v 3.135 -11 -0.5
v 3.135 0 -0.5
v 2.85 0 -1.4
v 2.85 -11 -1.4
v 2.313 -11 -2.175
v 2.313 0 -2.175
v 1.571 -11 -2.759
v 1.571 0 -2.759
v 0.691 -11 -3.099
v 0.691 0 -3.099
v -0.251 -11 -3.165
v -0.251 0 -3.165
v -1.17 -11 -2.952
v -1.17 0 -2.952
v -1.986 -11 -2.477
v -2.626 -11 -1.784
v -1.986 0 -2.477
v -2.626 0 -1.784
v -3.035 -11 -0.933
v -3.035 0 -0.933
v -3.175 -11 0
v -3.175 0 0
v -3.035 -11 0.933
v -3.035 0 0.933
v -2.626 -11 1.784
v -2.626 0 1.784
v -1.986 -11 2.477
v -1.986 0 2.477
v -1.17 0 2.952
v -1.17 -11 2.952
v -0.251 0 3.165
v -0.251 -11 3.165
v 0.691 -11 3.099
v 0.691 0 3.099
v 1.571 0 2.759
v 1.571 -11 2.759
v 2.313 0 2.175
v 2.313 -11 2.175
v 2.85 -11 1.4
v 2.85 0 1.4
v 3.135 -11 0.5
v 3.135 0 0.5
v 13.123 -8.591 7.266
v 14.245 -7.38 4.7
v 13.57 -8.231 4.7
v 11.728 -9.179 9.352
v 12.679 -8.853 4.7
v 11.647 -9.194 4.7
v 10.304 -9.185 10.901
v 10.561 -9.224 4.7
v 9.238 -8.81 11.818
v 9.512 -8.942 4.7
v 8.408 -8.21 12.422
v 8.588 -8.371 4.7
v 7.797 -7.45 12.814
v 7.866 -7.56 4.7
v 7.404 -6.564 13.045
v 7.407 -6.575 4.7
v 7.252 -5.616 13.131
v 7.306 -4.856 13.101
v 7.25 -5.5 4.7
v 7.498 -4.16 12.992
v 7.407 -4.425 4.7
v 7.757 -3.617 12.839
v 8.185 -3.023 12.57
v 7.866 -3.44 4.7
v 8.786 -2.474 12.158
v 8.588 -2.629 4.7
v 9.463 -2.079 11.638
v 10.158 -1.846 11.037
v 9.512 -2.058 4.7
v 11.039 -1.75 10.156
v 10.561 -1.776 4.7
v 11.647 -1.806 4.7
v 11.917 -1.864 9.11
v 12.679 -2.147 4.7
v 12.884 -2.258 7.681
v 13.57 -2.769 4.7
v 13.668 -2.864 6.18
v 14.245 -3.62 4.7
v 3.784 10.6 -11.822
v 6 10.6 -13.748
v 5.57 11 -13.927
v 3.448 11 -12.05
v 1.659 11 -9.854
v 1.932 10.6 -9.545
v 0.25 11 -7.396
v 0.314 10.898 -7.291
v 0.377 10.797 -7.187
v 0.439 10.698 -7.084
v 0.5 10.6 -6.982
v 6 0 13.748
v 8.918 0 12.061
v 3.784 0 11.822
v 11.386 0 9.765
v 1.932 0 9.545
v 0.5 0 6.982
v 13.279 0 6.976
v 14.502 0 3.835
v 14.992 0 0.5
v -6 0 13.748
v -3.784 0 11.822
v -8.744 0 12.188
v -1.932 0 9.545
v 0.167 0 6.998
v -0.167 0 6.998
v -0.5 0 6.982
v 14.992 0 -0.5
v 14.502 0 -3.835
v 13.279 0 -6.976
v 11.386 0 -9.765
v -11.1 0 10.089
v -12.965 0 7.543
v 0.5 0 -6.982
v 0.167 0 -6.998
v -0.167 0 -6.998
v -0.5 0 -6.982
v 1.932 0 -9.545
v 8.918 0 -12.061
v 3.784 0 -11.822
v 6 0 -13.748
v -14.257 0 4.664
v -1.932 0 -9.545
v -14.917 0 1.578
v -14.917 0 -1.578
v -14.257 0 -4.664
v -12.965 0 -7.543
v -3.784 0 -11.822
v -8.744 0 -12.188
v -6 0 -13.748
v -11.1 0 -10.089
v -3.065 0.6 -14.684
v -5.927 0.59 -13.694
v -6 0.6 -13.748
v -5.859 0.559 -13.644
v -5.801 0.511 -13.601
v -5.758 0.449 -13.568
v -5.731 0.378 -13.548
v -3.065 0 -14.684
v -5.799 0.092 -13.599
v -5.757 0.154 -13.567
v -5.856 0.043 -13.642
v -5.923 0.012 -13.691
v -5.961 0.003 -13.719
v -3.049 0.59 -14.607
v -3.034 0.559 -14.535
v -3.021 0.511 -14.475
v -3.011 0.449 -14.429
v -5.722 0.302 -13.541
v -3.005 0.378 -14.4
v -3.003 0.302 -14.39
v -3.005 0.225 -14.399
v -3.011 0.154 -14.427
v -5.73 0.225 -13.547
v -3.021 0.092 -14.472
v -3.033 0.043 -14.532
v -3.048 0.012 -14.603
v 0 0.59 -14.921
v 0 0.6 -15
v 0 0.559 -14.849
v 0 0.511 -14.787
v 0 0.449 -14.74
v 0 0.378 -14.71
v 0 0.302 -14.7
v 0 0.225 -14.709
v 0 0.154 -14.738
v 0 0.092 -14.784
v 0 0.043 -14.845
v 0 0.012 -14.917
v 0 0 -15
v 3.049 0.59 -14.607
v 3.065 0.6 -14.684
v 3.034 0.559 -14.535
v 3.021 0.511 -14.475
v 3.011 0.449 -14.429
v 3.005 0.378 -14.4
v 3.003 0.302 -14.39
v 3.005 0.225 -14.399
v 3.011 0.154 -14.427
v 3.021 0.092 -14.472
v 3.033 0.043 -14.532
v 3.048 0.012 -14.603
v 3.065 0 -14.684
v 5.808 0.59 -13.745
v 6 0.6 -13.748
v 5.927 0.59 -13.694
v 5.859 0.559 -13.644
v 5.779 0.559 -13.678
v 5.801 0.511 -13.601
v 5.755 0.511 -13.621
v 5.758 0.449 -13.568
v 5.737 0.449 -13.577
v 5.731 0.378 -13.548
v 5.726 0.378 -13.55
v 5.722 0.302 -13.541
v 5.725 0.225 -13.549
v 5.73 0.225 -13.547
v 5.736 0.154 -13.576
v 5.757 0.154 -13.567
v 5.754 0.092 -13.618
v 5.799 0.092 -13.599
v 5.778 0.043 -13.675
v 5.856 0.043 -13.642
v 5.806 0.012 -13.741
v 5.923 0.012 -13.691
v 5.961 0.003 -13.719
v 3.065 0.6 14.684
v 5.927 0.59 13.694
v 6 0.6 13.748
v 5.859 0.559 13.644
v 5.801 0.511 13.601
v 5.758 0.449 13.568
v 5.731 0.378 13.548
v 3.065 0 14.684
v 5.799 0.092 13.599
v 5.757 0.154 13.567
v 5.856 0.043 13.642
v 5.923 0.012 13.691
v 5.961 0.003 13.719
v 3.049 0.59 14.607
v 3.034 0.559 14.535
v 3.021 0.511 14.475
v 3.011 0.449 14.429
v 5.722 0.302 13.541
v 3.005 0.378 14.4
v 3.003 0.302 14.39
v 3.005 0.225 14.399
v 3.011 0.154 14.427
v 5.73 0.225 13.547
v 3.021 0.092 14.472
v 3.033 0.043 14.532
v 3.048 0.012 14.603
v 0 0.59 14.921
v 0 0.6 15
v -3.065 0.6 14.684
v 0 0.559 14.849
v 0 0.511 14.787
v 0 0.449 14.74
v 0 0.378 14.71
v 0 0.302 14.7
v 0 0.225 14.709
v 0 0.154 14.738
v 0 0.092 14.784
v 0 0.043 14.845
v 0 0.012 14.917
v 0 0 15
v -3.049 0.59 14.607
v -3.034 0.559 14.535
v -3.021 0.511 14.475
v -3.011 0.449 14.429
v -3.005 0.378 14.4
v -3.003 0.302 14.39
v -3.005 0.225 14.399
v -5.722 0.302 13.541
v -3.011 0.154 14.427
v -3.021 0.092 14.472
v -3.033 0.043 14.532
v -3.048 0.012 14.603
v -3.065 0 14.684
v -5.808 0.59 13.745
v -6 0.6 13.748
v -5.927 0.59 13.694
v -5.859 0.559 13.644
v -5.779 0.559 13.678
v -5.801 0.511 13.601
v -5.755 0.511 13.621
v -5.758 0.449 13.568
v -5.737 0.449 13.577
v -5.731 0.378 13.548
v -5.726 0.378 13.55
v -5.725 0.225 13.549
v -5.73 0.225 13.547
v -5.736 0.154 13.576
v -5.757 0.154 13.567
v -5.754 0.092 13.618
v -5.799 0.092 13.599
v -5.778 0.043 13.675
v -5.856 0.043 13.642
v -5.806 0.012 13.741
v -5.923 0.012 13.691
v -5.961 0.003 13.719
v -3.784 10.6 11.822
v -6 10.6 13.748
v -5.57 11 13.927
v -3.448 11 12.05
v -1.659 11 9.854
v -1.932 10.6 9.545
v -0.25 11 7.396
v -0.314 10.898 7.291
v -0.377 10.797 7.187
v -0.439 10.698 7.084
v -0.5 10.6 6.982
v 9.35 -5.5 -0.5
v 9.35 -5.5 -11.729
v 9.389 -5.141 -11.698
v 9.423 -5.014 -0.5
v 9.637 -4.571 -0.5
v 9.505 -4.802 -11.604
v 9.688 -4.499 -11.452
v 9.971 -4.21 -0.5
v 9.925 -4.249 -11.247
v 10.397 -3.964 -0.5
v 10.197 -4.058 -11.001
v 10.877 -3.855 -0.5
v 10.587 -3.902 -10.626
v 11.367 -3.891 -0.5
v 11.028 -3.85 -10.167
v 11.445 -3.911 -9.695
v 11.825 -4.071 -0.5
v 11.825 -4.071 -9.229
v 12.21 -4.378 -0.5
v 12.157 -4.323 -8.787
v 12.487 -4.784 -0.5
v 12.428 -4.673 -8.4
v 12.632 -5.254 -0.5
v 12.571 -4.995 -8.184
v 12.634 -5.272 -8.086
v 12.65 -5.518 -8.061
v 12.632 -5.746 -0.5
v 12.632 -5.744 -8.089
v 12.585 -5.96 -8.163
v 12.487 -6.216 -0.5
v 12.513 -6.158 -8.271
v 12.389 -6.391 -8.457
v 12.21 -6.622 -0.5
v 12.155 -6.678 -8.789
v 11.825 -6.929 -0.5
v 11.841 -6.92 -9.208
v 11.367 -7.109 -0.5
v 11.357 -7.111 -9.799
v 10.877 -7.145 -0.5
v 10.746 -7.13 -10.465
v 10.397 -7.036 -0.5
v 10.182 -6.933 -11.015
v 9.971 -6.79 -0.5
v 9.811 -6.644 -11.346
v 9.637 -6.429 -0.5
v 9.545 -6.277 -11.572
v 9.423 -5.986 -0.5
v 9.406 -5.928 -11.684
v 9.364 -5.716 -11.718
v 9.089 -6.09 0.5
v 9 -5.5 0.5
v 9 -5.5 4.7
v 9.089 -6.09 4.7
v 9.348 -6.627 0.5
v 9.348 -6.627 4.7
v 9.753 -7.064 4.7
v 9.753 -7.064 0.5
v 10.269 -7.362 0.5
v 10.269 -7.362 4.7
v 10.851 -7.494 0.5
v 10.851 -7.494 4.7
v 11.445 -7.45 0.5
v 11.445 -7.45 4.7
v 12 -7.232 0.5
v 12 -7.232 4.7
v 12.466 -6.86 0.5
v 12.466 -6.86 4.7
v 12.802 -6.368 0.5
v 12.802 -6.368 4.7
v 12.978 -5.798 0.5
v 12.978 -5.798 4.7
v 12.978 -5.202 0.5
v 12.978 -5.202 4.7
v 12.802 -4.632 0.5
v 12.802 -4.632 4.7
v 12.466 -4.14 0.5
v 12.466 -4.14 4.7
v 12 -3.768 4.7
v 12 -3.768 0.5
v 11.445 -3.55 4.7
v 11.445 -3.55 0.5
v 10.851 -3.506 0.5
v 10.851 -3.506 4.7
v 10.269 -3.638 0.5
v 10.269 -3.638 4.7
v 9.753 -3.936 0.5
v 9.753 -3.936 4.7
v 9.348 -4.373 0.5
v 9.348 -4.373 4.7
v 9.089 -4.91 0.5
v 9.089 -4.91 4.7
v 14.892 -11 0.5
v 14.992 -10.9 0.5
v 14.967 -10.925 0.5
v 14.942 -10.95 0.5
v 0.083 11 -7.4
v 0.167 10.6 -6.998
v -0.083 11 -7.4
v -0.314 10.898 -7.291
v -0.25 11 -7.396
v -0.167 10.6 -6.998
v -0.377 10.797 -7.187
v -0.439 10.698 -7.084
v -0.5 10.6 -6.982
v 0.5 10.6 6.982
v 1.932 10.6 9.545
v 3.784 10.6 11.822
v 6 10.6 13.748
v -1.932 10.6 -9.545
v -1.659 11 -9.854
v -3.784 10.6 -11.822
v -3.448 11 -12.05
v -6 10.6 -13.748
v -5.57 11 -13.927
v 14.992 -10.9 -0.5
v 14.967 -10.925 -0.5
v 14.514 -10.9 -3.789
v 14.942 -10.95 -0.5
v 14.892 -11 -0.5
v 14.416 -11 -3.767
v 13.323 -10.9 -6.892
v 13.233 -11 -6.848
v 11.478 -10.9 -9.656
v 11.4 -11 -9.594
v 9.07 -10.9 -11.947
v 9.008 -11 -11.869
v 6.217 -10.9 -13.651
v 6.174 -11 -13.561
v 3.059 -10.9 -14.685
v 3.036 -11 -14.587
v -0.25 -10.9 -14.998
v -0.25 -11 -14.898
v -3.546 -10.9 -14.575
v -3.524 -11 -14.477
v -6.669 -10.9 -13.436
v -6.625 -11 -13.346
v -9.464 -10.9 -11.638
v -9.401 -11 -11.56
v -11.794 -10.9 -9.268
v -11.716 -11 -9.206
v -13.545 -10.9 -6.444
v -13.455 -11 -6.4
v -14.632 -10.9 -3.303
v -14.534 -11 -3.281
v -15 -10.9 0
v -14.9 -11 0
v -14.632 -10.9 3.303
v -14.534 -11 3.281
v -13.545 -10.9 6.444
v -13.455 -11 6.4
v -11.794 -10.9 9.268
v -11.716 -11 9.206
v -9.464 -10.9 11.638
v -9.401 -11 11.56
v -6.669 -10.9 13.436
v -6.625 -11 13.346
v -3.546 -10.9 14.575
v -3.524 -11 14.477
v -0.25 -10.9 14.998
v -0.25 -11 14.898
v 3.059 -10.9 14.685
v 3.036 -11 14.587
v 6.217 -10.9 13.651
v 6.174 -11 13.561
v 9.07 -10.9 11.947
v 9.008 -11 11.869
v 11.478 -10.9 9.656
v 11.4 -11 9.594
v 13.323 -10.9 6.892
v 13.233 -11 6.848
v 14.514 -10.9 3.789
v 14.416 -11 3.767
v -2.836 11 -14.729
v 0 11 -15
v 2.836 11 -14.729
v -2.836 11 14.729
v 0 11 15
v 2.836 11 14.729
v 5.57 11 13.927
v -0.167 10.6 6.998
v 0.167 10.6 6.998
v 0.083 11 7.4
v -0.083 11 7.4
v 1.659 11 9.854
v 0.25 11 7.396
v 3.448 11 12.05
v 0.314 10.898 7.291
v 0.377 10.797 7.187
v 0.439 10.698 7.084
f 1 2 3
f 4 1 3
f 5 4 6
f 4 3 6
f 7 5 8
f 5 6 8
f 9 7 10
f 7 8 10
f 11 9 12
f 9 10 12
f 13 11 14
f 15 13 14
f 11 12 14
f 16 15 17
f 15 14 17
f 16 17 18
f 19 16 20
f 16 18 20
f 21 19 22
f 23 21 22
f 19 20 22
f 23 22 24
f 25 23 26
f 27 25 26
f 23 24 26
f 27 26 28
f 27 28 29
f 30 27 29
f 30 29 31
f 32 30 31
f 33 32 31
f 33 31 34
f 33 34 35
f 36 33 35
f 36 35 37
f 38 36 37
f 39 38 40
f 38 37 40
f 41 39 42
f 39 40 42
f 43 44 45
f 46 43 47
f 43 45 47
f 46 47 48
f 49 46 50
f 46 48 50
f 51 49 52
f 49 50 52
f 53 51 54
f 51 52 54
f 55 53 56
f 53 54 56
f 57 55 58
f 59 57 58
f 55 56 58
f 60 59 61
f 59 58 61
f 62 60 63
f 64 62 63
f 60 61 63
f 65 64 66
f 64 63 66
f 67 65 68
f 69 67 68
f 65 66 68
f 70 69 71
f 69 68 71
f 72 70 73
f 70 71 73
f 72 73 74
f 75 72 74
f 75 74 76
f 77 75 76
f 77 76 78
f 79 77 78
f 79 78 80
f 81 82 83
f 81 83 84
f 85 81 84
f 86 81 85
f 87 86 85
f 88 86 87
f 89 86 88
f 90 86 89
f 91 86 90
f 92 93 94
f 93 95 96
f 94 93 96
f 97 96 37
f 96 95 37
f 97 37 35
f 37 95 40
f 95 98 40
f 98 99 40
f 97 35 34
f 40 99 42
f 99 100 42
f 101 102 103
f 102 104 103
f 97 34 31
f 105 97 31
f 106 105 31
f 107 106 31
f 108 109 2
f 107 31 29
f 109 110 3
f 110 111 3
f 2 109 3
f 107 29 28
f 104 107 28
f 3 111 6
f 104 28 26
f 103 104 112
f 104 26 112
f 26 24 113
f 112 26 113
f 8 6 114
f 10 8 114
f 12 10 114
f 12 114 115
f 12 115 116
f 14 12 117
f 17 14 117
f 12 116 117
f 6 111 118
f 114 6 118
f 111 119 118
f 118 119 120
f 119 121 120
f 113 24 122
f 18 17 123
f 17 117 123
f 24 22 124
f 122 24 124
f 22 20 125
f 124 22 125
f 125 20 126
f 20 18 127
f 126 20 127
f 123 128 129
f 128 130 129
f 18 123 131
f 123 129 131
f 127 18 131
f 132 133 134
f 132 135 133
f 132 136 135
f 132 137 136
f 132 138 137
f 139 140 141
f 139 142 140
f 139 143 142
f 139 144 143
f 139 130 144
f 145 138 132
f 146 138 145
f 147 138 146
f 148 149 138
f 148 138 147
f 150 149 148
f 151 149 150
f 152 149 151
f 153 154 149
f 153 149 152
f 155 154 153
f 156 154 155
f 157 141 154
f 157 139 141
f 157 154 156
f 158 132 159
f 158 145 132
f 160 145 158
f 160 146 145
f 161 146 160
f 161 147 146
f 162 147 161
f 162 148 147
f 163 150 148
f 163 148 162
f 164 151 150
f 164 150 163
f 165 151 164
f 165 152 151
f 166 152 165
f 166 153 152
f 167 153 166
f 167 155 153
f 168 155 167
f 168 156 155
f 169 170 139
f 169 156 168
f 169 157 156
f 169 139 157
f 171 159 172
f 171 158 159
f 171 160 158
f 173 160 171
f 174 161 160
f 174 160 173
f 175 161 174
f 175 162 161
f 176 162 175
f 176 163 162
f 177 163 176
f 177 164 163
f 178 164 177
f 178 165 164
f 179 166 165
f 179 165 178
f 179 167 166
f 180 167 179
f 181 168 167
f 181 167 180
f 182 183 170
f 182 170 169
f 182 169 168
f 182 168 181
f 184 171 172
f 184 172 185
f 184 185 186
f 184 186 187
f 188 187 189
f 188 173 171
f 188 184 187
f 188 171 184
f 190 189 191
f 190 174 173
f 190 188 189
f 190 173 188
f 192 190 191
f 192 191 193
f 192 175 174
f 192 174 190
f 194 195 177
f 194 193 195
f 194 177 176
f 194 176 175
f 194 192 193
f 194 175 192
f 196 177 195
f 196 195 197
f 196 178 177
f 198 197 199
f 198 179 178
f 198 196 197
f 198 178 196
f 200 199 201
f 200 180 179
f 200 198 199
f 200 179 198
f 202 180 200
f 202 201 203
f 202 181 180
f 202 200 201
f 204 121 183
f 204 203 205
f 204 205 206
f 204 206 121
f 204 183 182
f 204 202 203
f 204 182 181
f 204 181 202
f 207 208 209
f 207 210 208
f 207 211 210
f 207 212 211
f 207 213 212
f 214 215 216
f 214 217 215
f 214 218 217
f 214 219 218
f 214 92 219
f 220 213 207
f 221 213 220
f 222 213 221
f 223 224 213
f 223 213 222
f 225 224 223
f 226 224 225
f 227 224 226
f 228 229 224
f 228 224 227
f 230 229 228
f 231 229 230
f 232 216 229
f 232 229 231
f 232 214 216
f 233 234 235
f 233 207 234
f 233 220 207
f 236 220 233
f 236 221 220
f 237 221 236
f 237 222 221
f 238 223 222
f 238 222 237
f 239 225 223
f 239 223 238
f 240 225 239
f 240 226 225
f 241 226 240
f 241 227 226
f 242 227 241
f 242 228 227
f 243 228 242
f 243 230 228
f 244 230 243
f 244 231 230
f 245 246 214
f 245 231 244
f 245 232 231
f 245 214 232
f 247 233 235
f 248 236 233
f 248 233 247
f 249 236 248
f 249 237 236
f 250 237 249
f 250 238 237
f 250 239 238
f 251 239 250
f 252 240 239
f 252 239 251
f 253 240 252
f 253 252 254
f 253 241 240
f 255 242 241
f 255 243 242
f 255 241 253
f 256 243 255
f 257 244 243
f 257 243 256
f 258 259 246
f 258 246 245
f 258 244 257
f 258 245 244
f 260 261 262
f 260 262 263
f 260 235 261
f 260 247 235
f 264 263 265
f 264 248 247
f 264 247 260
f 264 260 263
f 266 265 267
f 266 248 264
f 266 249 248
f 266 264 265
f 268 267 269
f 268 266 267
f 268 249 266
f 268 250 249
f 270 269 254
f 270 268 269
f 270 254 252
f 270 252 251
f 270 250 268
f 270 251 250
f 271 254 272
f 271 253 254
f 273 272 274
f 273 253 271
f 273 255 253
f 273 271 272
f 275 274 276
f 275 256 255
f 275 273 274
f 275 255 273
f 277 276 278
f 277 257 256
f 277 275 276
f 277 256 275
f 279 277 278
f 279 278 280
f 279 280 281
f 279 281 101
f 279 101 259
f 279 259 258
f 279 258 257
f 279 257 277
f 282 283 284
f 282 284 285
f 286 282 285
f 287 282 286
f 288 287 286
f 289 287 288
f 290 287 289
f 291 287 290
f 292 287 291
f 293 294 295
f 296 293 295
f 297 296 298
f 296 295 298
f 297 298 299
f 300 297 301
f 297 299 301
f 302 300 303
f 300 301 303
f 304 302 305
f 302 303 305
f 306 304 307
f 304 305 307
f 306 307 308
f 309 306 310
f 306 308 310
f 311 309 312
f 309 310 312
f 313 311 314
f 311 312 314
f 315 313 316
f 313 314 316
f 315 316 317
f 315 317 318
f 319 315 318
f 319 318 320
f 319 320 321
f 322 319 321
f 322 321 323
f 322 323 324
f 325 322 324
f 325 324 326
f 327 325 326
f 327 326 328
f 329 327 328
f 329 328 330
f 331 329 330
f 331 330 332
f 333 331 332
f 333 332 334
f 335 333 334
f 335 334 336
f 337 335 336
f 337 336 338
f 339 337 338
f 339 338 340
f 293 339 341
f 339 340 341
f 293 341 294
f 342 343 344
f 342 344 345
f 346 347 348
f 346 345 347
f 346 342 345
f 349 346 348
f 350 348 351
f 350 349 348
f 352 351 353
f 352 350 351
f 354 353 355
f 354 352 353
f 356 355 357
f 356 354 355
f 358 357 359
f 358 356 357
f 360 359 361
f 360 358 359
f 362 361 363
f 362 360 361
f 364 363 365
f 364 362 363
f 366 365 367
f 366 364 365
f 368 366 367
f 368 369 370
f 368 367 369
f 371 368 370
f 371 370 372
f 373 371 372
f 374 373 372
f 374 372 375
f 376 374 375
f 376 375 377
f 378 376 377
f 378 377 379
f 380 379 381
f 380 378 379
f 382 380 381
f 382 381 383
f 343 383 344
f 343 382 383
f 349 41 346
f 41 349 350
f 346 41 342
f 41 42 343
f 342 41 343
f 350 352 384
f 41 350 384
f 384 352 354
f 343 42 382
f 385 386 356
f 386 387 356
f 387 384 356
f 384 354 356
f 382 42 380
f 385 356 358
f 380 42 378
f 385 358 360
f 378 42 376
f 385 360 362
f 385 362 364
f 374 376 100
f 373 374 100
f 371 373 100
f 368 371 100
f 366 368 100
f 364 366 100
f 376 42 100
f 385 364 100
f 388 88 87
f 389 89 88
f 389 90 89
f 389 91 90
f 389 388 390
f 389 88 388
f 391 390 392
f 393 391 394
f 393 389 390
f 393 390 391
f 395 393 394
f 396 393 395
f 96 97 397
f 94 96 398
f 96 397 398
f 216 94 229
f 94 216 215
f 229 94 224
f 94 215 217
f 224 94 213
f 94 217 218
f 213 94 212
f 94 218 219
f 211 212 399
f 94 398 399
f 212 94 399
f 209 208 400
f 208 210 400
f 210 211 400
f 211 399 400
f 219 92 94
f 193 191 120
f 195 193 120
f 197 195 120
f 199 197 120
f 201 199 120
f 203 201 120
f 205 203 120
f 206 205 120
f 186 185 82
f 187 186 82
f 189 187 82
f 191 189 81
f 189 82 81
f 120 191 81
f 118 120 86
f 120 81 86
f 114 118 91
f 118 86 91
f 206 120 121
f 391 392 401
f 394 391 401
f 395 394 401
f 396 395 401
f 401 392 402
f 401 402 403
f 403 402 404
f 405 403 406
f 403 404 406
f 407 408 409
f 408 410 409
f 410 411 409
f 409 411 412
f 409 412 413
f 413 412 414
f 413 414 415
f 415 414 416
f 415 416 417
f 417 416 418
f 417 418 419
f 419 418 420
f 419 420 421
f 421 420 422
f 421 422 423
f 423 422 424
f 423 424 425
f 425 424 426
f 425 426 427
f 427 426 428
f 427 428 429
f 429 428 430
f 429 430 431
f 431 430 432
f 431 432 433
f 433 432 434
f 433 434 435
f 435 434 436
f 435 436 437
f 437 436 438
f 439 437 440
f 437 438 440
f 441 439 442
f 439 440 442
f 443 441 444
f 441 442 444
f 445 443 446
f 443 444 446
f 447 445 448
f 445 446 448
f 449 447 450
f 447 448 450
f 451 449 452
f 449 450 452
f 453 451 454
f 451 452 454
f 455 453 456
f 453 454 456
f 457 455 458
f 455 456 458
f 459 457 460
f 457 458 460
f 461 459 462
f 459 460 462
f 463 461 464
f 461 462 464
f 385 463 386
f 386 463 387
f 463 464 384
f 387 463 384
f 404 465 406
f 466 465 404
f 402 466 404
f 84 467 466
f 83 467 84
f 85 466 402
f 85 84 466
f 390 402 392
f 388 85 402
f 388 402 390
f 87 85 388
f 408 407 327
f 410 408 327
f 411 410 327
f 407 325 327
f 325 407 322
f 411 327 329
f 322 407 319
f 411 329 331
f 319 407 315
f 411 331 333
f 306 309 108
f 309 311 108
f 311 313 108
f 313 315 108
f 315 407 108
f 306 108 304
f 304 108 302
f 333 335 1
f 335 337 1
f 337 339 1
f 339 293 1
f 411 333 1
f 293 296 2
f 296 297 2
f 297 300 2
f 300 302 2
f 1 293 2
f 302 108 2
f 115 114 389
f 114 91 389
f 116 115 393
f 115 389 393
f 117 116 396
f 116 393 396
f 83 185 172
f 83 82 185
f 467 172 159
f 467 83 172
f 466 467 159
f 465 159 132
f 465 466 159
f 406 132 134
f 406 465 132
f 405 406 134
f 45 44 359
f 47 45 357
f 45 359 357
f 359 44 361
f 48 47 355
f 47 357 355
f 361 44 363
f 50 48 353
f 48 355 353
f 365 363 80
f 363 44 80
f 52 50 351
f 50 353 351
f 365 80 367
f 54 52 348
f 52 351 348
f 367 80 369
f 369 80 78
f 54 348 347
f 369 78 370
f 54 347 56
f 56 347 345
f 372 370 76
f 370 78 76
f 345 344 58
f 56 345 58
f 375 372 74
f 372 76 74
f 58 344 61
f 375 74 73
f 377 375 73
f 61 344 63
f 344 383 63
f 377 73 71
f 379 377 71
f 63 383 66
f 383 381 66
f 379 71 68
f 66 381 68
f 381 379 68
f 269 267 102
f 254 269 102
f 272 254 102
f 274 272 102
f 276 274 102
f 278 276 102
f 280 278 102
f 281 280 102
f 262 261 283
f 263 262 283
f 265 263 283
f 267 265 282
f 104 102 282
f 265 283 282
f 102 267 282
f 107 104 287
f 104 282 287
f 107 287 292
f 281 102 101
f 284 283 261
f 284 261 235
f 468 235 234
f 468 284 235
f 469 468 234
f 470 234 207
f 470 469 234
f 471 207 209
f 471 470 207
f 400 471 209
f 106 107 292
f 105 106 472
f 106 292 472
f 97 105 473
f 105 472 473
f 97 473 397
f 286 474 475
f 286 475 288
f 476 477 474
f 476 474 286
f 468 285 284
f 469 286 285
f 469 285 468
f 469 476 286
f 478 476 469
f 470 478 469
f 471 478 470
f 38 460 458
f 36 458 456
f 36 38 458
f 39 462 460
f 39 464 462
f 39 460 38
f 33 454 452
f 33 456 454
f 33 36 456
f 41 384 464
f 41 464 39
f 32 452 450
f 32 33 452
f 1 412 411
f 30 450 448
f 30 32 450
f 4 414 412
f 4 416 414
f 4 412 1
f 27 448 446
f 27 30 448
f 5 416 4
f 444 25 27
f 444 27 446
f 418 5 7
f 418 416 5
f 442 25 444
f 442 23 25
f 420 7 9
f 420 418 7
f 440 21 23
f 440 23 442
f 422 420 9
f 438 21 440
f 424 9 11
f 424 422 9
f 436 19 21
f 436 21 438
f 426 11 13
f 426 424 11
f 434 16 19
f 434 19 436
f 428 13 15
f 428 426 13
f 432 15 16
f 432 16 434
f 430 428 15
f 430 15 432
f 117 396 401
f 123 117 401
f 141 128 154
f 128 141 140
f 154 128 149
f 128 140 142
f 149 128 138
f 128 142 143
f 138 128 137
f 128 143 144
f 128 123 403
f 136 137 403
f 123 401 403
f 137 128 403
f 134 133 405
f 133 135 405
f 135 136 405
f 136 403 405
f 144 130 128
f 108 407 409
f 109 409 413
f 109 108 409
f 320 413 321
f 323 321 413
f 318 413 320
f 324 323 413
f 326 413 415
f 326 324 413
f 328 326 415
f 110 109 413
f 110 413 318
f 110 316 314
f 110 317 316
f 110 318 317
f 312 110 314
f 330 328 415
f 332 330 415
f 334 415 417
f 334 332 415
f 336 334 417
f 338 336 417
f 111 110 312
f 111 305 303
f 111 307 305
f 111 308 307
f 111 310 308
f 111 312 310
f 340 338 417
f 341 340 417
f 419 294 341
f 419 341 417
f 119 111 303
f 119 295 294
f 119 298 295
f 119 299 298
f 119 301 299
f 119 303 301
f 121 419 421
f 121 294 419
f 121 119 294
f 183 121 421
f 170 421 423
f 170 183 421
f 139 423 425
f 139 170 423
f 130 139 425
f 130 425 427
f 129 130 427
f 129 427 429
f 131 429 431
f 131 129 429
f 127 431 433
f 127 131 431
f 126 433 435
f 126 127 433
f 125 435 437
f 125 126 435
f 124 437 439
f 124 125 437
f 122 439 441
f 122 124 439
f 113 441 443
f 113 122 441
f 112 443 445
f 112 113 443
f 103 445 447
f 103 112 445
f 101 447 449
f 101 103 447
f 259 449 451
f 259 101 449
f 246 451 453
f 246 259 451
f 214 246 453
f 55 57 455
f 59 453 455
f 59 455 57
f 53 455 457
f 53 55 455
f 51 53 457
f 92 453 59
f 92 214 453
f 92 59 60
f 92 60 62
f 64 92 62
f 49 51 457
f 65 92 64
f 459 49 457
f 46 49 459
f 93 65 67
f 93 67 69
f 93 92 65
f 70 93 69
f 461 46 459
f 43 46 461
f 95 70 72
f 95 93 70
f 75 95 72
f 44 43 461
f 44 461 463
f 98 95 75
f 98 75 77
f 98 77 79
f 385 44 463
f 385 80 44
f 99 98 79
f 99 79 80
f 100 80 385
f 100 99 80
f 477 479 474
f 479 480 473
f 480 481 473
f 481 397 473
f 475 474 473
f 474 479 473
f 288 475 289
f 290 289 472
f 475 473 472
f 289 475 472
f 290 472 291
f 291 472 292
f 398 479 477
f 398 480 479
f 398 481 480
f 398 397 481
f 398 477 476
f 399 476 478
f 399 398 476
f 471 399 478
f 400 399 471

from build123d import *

# Parameters (mm, degrees)
SKETCH1_R                   = 15
BOSS_EXTRUDE1_DEPTH         = 11
SKETCH2_R                   = 7
CUT_EXTRUDE1_DEPTH          = 23
SKETCH3_R                   = 17
CUT_EXTRUDE2_DEPTH          = 11
CUT_EXTRUDE3_DEPTH          = 11
SKETCH5_W                   = 16.165630516
SKETCH5_H                   = 1
CUT_EXTRUDE4_DEPTH          = 21
SKETCH6_R                   = 2
CUT_EXTRUDE5_DEPTH          = 21
CUT_EXTRUDE6_START          = -4.2
SKETCH7_R                   = 3.75
CUT_EXTRUDE6_DEPTH          = 21
M4_TAPPED_HOLE1_D           = 3.3
M4_TAPPED_HOLE1_DEPTH       = 20.1
M4_TAPPED_HOLE1_TIP         = 0.991420021
CHAMFER1_SIZE               = 0.4
SKETCH10_R                  = 0.3
CHAMFER2_SIZE               = 0.1
Y_KSEKLIK_EKSTR_ZYON1_DEPTH = 11


with BuildPart() as part:
    # Sketch1 → Boss-Extrude1 (new, symmetric)
    with BuildSketch(Plane(origin=(0, 0, 0), x_dir=(1, 0, 0), z_dir=(0, 1, 0))):
        with Locations(Location((0, 0, 0), (0, 0, 270))):
            Circle(SKETCH1_R)
    extrude(amount=BOSS_EXTRUDE1_DEPTH, both=True)

    # Sketch2 → Cut-Extrude1 (cut)
    with BuildSketch(Plane(origin=(0, 11, 0), x_dir=(1, 0, 0), z_dir=(0, 1, 0))):
        with Locations(Location((0, 0, 0), (0, 0, 270))):
            Circle(SKETCH2_R)
    extrude(amount=-CUT_EXTRUDE1_DEPTH, mode=Mode.SUBTRACT)

    # Sketch3 → Cut-Extrude2 (cut)
    with BuildSketch(Plane(origin=(0, 11, 0), x_dir=(1, 0, 0), z_dir=(0, 1, 0))):
        with Locations((16, 0)):
            Circle(SKETCH3_R)
    extrude(amount=-CUT_EXTRUDE2_DEPTH, mode=Mode.SUBTRACT)

    # Sketch4 → Cut-Extrude3 (cut)
    with BuildSketch(Plane(origin=(0, 11, 0), x_dir=(1, 0, 0), z_dir=(0, 1, 0))):
        with BuildLine():
            ThreePointArc((-6, 13.747727085), (-15, 0), (-6, -13.747727085))
            ThreePointArc((-6, -13.747727085), (-2.808871931, -10.72353208), (-0.5, -6.982120022))
            ThreePointArc((-0.5, -6.982120022), (-7, 0), (-0.5, 6.982120022))
            ThreePointArc((-0.5, 6.982120022), (-2.808871931, 10.72353208), (-6, 13.747727085))
        make_face()
    extrude(amount=-CUT_EXTRUDE3_DEPTH, mode=Mode.SUBTRACT)

    # Sketch5 → Cut-Extrude4 (cut)
    with BuildSketch(Plane(origin=(0, 0, 0), x_dir=(1, 0, 0), z_dir=(0, 1, 0))):
        with Locations((11.807437966, 0)):
            Rectangle(SKETCH5_W, SKETCH5_H)
    extrude(amount=-CUT_EXTRUDE4_DEPTH, mode=Mode.SUBTRACT)

    # Sketch6 → Cut-Extrude5 (cut)
    with BuildSketch(Plane.XY):
        with Locations(Location((11, -5.5, 0), (0, 0, 180))):
            Circle(SKETCH6_R)
    extrude(amount=CUT_EXTRUDE5_DEPTH, mode=Mode.SUBTRACT)

    # Sketch7 → Cut-Extrude6 (cut)
    with BuildSketch(Plane(origin=(0, 0, 0.5), x_dir=(-1, 0, 0), z_dir=(0, 0, -1)).offset(CUT_EXTRUDE6_START)):
        with Locations((-11, -5.5)):
            Circle(SKETCH7_R)
    extrude(amount=-CUT_EXTRUDE6_DEPTH, mode=Mode.SUBTRACT)

    # M4 Tapped Hole1
    with Locations(Plane.XY.offset(-0.5)):
        with Locations((11, -5.5)):
            Hole(M4_TAPPED_HOLE1_D / 2, depth=M4_TAPPED_HOLE1_DEPTH)
            with Locations((0, 0, -(M4_TAPPED_HOLE1_DEPTH + M4_TAPPED_HOLE1_TIP / 2))):  # 118° drill point
                Cone(0, M4_TAPPED_HOLE1_D / 2, M4_TAPPED_HOLE1_TIP, mode=Mode.SUBTRACT)

    # Chamfer1
    chamfer1_edges = [part.edges().sort_by_distance(p)[0] for p in [
        (0, 11, -7),
        (2.808871931, 11, 10.72353208),
        (2.808871931, 11, -10.72353208),
        (0, 11, 7),
        (-2.808871931, 11, -10.72353208),
        (-2.808871931, 11, 10.72353208),
    ]]
    chamfer(chamfer1_edges, length=CHAMFER1_SIZE)

    # Sketch10 → Cut-Revolve1 (revolve, cut)
    with BuildSketch(Plane(origin=(0, 0, 0), x_dir=(0, 0, -1), z_dir=(1, 0, 0))):
        with Locations((15, 0.3)):
            Circle(SKETCH10_R)
    revolve(axis=Axis((0, 3.360414074, 0), (0, -1, 0)), mode=Mode.SUBTRACT)

    # Chamfer2
    chamfer2_edges = [part.edges().sort_by_distance(p)[0] for p in [
        (-15, -11, 0),
    ]]
    chamfer(chamfer2_edges, length=CHAMFER2_SIZE)

    # Çizim1 → Yükseklik-Ekstrüzyon1 (add)
    with BuildSketch(Plane(origin=(0, 0, 0), x_dir=(1, 0, 0), z_dir=(0, 1, 0))):
        with BuildLine():
            Line((6.982120022, 0.5), (3.135382752, 0.5))
            ThreePointArc((3.135382752, 0.5), (-3.175, 0), (3.135382752, -0.5))
            Line((3.135382752, -0.5), (6.982120022, -0.5))
            ThreePointArc((6.982120022, -0.5), (-7, 0), (6.982120022, 0.5))
        make_face()
    extrude(amount=-Y_KSEKLIK_EKSTR_ZYON1_DEPTH)


solid = part.part
